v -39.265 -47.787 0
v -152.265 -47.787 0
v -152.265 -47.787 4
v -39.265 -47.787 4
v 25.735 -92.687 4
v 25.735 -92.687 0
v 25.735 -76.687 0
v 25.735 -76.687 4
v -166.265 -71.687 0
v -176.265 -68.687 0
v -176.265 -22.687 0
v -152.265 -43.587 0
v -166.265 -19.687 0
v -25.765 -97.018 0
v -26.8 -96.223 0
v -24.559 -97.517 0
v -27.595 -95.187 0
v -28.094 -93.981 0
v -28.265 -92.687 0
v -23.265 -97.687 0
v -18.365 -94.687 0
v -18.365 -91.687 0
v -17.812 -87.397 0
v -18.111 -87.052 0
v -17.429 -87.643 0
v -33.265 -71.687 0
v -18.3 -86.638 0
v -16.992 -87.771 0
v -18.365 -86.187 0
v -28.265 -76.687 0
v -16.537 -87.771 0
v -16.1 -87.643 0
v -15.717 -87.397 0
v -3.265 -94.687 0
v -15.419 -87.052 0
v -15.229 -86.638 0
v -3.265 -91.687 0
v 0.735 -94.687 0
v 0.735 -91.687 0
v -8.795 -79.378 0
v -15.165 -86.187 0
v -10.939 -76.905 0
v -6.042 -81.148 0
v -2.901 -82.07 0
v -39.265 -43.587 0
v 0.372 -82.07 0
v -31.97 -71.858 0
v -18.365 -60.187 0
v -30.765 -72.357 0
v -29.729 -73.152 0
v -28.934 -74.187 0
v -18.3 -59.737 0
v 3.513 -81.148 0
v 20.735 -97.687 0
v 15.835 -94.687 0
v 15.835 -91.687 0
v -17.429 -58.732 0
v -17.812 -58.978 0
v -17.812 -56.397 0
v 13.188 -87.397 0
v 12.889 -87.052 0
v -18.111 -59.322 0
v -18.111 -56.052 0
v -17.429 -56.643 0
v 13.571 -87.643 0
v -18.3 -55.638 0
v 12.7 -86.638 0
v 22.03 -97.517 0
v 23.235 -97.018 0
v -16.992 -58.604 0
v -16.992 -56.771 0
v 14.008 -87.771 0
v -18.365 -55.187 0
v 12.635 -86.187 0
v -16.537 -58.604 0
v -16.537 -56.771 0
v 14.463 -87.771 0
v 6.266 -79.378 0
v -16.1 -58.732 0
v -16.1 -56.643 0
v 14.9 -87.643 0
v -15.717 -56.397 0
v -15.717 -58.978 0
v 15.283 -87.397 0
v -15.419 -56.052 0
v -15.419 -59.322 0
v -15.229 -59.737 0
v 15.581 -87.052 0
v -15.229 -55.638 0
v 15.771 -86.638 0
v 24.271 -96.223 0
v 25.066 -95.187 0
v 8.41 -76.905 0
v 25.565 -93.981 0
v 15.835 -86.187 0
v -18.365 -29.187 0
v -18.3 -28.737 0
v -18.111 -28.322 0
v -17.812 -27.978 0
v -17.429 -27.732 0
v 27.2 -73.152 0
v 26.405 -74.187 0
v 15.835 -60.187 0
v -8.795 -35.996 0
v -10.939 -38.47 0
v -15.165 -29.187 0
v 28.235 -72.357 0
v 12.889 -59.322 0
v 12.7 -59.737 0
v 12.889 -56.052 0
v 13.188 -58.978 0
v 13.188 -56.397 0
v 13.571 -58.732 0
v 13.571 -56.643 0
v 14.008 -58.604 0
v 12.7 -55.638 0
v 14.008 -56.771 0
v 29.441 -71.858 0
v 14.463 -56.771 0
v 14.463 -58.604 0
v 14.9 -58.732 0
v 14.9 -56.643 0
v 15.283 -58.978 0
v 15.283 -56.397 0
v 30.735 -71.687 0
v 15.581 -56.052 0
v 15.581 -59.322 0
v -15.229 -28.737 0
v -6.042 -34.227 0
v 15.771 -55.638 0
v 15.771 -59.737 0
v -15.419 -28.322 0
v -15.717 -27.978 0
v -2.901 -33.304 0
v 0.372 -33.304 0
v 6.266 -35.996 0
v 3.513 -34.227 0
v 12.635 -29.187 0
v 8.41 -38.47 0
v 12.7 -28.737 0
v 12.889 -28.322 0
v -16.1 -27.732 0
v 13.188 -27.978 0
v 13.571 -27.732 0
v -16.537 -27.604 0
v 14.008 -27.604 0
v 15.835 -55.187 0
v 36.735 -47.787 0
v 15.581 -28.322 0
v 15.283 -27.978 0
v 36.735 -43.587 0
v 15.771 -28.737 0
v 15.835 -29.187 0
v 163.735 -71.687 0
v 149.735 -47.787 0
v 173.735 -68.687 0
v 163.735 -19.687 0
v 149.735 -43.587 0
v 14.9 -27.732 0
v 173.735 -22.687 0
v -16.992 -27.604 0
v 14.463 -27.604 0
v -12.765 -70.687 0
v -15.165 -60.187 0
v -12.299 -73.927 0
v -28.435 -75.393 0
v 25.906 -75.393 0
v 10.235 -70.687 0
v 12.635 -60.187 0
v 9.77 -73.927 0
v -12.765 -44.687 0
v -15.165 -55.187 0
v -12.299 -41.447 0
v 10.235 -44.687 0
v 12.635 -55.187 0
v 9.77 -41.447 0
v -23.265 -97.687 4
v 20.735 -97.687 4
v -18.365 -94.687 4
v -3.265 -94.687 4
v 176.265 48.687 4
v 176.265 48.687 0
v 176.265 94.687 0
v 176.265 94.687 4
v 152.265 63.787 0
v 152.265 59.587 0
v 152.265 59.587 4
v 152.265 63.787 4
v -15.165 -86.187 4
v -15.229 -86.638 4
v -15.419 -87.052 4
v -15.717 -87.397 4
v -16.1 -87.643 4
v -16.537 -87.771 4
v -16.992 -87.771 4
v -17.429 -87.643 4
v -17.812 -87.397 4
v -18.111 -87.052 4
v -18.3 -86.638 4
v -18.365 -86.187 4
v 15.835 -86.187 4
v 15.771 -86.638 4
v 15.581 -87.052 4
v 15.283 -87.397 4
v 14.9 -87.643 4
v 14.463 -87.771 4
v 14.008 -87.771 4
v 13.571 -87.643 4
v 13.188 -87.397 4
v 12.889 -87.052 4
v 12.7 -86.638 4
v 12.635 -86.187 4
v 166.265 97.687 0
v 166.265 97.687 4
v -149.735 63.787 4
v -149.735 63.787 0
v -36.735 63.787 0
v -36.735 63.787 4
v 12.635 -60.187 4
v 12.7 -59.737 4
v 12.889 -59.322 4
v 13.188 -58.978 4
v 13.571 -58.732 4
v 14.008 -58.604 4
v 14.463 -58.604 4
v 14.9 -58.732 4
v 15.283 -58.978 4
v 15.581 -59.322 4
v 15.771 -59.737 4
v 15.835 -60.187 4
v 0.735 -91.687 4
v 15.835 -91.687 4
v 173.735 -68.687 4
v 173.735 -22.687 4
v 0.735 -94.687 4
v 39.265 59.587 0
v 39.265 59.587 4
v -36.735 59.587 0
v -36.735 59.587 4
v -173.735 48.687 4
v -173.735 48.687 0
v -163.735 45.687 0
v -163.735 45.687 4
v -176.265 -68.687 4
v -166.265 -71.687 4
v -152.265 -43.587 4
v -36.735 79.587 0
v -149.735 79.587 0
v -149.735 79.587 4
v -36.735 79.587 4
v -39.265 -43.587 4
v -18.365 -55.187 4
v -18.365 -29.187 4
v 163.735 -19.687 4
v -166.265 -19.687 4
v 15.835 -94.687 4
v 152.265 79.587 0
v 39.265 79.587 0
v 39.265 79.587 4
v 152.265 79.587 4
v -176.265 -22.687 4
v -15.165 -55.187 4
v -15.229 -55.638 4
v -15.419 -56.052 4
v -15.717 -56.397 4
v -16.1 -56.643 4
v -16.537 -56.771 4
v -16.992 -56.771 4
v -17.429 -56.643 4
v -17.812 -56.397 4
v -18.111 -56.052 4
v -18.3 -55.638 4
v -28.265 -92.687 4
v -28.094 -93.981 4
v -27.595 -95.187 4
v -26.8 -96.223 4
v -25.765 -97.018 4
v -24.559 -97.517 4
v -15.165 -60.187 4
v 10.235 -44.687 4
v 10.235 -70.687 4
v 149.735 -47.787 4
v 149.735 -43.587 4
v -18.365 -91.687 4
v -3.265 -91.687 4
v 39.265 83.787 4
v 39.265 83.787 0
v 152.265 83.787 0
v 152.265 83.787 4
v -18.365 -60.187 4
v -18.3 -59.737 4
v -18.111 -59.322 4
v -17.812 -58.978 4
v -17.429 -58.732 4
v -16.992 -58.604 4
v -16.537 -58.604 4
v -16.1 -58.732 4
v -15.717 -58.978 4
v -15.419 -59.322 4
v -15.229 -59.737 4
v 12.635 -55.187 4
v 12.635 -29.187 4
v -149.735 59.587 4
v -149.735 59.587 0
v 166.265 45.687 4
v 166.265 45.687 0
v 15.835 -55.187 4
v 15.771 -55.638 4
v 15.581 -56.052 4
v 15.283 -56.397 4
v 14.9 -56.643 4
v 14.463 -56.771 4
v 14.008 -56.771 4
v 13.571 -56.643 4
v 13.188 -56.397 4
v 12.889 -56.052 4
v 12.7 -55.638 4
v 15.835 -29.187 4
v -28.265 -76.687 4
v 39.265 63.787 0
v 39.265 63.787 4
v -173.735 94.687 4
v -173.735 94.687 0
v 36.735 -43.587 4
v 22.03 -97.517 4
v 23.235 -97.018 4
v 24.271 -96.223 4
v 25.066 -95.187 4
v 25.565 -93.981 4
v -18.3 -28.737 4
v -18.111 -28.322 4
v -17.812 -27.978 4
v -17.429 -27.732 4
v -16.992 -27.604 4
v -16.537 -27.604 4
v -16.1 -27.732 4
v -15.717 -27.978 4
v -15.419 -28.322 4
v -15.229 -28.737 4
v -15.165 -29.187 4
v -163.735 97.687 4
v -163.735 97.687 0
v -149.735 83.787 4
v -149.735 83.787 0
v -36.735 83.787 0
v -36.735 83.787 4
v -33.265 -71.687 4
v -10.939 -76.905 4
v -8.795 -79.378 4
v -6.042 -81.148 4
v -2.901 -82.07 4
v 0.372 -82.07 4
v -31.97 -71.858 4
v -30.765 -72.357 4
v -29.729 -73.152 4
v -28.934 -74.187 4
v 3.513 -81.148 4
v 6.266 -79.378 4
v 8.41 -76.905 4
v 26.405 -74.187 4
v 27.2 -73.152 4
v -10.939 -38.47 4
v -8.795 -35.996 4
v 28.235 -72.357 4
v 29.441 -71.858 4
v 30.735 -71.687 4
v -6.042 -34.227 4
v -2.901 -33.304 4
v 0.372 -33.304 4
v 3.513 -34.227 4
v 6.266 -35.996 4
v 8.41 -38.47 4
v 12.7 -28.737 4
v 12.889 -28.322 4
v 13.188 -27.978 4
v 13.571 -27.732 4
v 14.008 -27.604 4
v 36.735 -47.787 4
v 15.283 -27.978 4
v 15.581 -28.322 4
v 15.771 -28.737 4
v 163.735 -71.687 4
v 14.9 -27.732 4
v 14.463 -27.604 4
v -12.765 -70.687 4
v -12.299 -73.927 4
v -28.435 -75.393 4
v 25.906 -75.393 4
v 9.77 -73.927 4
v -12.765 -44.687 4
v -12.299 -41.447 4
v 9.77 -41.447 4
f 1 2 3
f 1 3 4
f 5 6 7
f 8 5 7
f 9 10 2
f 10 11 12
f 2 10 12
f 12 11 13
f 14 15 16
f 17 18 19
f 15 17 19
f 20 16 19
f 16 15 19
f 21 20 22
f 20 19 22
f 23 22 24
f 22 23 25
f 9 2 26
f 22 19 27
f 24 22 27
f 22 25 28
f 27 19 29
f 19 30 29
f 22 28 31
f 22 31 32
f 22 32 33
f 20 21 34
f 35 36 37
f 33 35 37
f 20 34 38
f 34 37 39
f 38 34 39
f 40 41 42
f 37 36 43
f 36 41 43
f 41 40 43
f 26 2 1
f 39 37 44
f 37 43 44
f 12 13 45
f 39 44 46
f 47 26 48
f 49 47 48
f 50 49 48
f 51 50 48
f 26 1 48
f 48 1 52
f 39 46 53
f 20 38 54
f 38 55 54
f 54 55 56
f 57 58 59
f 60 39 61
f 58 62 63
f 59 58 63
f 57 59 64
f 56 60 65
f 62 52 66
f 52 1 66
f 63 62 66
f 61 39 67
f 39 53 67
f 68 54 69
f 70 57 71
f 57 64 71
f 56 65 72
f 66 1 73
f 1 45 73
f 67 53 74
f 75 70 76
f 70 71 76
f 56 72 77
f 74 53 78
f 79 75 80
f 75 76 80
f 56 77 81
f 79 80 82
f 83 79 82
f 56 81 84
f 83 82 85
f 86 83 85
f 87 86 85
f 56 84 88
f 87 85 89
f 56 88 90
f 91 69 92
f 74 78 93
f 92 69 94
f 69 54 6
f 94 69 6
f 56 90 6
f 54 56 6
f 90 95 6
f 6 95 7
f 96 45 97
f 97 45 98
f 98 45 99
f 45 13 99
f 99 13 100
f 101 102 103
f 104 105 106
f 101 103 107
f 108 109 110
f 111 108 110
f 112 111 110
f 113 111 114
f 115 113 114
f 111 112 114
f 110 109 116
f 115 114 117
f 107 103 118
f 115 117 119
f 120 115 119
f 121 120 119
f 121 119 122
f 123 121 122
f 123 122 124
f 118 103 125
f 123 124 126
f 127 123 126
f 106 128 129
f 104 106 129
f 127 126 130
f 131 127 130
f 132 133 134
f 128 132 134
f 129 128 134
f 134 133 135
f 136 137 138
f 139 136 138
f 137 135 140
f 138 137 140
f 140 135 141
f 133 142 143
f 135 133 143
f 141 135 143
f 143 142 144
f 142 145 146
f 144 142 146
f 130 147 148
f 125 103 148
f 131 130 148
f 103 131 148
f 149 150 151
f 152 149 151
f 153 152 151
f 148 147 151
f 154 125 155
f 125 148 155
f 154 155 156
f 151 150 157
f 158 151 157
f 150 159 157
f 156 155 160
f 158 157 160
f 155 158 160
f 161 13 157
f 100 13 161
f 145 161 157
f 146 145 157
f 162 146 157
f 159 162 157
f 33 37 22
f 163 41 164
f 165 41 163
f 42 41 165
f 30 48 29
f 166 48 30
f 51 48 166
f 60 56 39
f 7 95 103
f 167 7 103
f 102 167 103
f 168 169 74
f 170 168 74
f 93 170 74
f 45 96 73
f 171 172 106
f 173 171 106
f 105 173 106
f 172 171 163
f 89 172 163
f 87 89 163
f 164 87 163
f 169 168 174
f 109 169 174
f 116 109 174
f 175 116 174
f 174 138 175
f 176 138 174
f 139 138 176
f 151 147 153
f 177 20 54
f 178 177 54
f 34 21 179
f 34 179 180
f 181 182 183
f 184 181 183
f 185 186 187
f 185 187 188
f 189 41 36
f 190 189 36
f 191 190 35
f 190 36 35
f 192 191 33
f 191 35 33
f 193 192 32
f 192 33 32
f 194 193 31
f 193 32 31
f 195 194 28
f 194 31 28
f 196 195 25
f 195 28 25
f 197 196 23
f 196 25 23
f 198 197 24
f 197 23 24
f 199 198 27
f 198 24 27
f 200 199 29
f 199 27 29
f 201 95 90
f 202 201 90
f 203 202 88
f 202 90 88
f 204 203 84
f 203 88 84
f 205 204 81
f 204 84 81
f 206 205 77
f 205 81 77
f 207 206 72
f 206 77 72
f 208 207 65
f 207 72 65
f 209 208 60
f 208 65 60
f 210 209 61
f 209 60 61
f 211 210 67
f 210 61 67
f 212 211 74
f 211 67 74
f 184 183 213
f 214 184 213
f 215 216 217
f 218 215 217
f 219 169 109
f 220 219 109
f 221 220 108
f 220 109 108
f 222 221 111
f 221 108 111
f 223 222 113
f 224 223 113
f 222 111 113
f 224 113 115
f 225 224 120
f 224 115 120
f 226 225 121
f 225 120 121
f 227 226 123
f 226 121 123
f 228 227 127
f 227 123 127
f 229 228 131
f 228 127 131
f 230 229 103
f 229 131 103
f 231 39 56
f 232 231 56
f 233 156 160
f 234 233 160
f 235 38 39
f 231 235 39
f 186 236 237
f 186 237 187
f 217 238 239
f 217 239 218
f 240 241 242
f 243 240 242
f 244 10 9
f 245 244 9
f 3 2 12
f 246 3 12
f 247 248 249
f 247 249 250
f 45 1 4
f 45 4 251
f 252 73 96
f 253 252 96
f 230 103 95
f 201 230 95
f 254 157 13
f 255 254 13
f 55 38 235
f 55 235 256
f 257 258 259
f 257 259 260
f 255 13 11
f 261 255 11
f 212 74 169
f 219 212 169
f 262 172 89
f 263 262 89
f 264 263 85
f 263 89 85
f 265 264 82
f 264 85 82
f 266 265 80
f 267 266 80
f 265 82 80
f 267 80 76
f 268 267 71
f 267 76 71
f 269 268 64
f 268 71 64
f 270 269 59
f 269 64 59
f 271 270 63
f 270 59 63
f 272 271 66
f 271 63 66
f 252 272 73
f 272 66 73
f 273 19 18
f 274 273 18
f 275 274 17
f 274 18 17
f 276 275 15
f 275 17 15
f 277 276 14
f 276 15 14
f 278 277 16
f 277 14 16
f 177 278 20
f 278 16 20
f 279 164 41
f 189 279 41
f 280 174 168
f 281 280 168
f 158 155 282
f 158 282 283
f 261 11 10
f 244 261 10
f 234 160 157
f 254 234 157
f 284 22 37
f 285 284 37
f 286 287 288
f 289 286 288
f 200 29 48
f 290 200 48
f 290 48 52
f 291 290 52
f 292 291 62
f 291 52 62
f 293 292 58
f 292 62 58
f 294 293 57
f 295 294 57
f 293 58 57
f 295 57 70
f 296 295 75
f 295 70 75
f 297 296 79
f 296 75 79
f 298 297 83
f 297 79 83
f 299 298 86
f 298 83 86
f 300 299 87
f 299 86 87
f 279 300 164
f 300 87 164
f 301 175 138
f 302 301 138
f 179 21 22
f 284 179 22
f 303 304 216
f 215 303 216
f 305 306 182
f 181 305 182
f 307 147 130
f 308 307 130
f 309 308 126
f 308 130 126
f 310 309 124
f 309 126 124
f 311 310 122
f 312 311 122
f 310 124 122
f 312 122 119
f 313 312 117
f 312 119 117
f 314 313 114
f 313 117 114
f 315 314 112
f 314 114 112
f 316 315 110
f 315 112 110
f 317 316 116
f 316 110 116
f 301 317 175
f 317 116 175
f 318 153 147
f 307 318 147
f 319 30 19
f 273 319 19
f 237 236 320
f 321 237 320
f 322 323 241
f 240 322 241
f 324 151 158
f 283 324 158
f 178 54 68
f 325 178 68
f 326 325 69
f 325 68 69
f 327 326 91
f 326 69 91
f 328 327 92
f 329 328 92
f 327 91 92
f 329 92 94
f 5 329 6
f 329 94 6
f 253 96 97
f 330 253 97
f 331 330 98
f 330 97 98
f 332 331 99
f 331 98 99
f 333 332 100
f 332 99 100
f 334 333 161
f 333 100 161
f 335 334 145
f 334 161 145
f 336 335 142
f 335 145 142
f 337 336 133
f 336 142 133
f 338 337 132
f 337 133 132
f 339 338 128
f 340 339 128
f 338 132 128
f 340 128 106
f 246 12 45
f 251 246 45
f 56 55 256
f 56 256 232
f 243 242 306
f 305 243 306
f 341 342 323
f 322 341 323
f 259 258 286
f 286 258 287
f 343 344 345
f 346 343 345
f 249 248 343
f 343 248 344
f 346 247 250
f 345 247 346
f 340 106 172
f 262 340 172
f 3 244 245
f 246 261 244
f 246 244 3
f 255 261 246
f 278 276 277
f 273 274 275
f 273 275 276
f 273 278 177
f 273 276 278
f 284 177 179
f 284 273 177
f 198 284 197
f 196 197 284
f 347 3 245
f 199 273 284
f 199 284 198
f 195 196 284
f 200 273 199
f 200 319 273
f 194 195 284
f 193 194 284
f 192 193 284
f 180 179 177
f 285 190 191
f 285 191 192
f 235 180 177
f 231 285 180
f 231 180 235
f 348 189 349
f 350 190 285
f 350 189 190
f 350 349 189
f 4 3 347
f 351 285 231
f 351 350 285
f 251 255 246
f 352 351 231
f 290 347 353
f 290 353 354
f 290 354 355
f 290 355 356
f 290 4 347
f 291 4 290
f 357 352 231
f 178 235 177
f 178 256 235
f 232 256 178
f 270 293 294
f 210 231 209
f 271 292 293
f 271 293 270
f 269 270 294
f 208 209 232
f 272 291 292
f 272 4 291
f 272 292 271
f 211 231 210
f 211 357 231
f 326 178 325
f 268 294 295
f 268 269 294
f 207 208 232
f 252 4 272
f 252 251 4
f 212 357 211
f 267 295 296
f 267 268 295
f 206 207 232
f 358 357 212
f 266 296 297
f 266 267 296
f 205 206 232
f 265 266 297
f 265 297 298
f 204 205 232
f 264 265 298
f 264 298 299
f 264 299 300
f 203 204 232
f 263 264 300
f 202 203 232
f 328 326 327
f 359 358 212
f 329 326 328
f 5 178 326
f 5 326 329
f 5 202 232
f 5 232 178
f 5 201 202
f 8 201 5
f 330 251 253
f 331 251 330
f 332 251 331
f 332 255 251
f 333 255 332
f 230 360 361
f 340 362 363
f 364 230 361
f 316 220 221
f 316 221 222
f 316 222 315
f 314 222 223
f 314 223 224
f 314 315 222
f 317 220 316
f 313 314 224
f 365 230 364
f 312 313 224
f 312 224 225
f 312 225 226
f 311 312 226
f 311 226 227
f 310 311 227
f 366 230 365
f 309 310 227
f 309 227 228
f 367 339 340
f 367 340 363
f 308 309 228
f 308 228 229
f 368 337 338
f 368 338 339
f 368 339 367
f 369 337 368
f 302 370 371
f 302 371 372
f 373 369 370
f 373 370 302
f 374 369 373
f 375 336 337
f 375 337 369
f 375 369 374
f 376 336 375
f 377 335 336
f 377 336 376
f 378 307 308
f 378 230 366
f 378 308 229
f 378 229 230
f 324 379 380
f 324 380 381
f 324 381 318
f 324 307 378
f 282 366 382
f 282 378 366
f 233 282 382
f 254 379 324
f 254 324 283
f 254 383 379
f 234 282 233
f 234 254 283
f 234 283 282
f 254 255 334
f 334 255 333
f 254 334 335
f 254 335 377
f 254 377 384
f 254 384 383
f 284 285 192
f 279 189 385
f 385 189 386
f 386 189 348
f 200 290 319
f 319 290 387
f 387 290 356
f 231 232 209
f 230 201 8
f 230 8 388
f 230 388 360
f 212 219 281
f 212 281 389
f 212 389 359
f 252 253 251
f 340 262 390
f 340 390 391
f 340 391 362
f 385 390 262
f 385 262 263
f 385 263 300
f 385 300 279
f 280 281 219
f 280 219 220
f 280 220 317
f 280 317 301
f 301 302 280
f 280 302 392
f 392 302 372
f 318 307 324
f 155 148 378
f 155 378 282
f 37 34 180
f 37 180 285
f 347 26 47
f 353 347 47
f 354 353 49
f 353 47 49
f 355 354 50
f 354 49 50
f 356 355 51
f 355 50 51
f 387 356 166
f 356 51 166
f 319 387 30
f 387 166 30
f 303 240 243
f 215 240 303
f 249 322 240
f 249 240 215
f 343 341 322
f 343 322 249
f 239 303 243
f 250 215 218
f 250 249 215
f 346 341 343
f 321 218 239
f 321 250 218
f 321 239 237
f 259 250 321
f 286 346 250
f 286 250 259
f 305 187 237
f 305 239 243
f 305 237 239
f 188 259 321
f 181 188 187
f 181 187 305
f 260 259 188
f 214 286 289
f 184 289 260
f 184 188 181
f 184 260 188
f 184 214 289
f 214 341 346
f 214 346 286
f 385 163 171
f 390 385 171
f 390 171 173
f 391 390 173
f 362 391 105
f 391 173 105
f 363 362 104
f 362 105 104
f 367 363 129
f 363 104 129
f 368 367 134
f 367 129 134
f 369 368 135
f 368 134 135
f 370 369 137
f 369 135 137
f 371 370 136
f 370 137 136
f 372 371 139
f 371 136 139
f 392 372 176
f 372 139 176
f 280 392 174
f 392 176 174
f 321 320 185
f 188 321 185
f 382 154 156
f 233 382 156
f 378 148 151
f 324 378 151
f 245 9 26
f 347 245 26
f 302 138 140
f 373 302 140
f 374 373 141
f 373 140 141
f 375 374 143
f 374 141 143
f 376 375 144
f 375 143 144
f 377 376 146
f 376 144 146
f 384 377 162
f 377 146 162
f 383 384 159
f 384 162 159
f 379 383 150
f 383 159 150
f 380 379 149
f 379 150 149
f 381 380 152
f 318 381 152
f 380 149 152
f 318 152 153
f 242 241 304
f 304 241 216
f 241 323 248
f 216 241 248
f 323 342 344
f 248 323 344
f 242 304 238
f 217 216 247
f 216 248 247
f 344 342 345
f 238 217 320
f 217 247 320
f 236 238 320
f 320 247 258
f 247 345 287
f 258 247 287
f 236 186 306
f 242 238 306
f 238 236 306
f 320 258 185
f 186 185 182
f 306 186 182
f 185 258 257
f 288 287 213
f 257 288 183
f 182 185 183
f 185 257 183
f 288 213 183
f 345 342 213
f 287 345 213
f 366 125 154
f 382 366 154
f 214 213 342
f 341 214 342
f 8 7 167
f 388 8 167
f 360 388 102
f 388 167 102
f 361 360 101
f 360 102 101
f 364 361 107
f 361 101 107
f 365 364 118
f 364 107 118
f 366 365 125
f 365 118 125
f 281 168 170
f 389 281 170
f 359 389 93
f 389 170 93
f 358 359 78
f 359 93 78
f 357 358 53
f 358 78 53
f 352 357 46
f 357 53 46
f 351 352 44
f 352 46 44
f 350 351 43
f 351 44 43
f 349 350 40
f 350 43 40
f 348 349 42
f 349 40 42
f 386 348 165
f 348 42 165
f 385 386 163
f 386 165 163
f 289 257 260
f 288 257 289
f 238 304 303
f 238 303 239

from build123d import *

# Parameters (mm, degrees)
F0_W     = 113
F0_H     = 4.2
F0_W_2   = 15.1
F0_H_2   = 3
F1_DEPTH = 4


with BuildPart() as f1:
    # F0 (on Top) → F1 (new body)
    with BuildSketch(Plane.XY):
        Polygon((-163.735444, 97.687372), (-173.735444, 94.687372), (-173.735444, 48.687372), (-163.735444, 45.687372), (166.264556, 45.687372), (176.264556, 48.687372), (176.264556, 94.687372), (166.264556, 97.687372), align=None)
        with Locations((-93.235444, 61.687372)):
            Rectangle(F0_W, F0_H, mode=Mode.SUBTRACT)
        with Locations((-93.235444, 81.687372)):
            Rectangle(F0_W, F0_H, mode=Mode.SUBTRACT)
        with Locations((95.764556, 61.687372)):
            Rectangle(F0_W, F0_H, mode=Mode.SUBTRACT)
        with Locations((95.764556, 81.687372)):
            Rectangle(F0_W, F0_H, mode=Mode.SUBTRACT)
        with BuildLine():
            Line((163.735445, -19.687373), (-166.264555, -19.687373))
            Line((-166.264555, -19.687373), (-176.264555, -22.687373))
            Line((-176.264555, -22.687373), (-176.264555, -68.687373))
            Line((-176.264555, -68.687373), (-166.264555, -71.687373))
            Line((-166.264555, -71.687373), (-33.264555, -71.687373))
            ThreePointArc((-33.264555, -71.687373), (-29.729021, -73.151839), (-28.264555, -76.687373))
            Line((-28.264555, -76.687373), (-28.264555, -92.687373))
            ThreePointArc((-28.264555, -92.687373), (-26.800089, -96.222907), (-23.264555, -97.687373))
            Line((-23.264555, -97.687373), (20.735445, -97.687373))
            ThreePointArc((20.735445, -97.687373), (24.270979, -96.222907), (25.735445, -92.687373))
            Line((25.735445, -92.687373), (25.735445, -76.687373))
            ThreePointArc((25.735445, -76.687373), (27.199911, -73.151839), (30.735445, -71.687373))
            Line((30.735445, -71.687373), (163.735445, -71.687373))
            Line((163.735445, -71.687373), (173.735445, -68.687373))
            Line((173.735445, -68.687373), (173.735445, -22.687373))
            Line((173.735445, -22.687373), (163.735445, -19.687373))
        make_face()
        with Locations((-10.814555, -93.187373)):
            Rectangle(F0_W_2, F0_H_2, mode=Mode.SUBTRACT)
        with BuildLine():
            Line((-15.164555, -60.187373), (-15.164555, -86.187373))
            ThreePointArc((-15.164555, -86.187373), (-16.764555, -87.787373), (-18.364555, -86.187373))
            Line((-18.364555, -86.187373), (-18.364555, -60.187373))
            ThreePointArc((-18.364555, -60.187373), (-16.764555, -58.587373), (-15.164555, -60.187373))
        make_face(mode=Mode.SUBTRACT)
        with BuildLine():
            Line((-12.764555, -70.687373), (-12.764555, -44.687373))
            ThreePointArc((-12.764555, -44.687373), (-1.264555, -33.187373), (10.235445, -44.687373))
            Line((10.235445, -44.687373), (10.235445, -70.687373))
            ThreePointArc((10.235445, -70.687373), (-1.264555, -82.187373), (-12.764555, -70.687373))
        make_face(mode=Mode.SUBTRACT)
        with Locations((-95.764555, -45.687373)):
            Rectangle(F0_W, F0_H, mode=Mode.SUBTRACT)
        with BuildLine():
            Line((-18.364555, -55.187373), (-18.364555, -29.187373))
            ThreePointArc((-18.364555, -29.187373), (-16.764555, -27.587373), (-15.164555, -29.187373))
            Line((-15.164555, -29.187373), (-15.164555, -55.187373))
            ThreePointArc((-15.164555, -55.187373), (-16.764555, -56.787373), (-18.364555, -55.187373))
        make_face(mode=Mode.SUBTRACT)
        with Locations((8.285445, -93.187373)):
            Rectangle(F0_W_2, F0_H_2, mode=Mode.SUBTRACT)
        with BuildLine():
            Line((15.835445, -60.187373), (15.835445, -86.187373))
            ThreePointArc((15.835445, -86.187373), (14.235445, -87.787373), (12.635445, -86.187373))
            Line((12.635445, -86.187373), (12.635445, -60.187373))
            ThreePointArc((12.635445, -60.187373), (14.235445, -58.587373), (15.835445, -60.187373))
        make_face(mode=Mode.SUBTRACT)
        with BuildLine():
            Line((12.635445, -55.187373), (12.635445, -29.187373))
            ThreePointArc((12.635445, -29.187373), (14.235445, -27.587373), (15.835445, -29.187373))
            Line((15.835445, -29.187373), (15.835445, -55.187373))
            ThreePointArc((15.835445, -55.187373), (14.235445, -56.787373), (12.635445, -55.187373))
        make_face(mode=Mode.SUBTRACT)
        with Locations((93.235445, -45.687373)):
            Rectangle(F0_W, F0_H, mode=Mode.SUBTRACT)
    extrude(amount=F1_DEPTH)


solid = f1.part
